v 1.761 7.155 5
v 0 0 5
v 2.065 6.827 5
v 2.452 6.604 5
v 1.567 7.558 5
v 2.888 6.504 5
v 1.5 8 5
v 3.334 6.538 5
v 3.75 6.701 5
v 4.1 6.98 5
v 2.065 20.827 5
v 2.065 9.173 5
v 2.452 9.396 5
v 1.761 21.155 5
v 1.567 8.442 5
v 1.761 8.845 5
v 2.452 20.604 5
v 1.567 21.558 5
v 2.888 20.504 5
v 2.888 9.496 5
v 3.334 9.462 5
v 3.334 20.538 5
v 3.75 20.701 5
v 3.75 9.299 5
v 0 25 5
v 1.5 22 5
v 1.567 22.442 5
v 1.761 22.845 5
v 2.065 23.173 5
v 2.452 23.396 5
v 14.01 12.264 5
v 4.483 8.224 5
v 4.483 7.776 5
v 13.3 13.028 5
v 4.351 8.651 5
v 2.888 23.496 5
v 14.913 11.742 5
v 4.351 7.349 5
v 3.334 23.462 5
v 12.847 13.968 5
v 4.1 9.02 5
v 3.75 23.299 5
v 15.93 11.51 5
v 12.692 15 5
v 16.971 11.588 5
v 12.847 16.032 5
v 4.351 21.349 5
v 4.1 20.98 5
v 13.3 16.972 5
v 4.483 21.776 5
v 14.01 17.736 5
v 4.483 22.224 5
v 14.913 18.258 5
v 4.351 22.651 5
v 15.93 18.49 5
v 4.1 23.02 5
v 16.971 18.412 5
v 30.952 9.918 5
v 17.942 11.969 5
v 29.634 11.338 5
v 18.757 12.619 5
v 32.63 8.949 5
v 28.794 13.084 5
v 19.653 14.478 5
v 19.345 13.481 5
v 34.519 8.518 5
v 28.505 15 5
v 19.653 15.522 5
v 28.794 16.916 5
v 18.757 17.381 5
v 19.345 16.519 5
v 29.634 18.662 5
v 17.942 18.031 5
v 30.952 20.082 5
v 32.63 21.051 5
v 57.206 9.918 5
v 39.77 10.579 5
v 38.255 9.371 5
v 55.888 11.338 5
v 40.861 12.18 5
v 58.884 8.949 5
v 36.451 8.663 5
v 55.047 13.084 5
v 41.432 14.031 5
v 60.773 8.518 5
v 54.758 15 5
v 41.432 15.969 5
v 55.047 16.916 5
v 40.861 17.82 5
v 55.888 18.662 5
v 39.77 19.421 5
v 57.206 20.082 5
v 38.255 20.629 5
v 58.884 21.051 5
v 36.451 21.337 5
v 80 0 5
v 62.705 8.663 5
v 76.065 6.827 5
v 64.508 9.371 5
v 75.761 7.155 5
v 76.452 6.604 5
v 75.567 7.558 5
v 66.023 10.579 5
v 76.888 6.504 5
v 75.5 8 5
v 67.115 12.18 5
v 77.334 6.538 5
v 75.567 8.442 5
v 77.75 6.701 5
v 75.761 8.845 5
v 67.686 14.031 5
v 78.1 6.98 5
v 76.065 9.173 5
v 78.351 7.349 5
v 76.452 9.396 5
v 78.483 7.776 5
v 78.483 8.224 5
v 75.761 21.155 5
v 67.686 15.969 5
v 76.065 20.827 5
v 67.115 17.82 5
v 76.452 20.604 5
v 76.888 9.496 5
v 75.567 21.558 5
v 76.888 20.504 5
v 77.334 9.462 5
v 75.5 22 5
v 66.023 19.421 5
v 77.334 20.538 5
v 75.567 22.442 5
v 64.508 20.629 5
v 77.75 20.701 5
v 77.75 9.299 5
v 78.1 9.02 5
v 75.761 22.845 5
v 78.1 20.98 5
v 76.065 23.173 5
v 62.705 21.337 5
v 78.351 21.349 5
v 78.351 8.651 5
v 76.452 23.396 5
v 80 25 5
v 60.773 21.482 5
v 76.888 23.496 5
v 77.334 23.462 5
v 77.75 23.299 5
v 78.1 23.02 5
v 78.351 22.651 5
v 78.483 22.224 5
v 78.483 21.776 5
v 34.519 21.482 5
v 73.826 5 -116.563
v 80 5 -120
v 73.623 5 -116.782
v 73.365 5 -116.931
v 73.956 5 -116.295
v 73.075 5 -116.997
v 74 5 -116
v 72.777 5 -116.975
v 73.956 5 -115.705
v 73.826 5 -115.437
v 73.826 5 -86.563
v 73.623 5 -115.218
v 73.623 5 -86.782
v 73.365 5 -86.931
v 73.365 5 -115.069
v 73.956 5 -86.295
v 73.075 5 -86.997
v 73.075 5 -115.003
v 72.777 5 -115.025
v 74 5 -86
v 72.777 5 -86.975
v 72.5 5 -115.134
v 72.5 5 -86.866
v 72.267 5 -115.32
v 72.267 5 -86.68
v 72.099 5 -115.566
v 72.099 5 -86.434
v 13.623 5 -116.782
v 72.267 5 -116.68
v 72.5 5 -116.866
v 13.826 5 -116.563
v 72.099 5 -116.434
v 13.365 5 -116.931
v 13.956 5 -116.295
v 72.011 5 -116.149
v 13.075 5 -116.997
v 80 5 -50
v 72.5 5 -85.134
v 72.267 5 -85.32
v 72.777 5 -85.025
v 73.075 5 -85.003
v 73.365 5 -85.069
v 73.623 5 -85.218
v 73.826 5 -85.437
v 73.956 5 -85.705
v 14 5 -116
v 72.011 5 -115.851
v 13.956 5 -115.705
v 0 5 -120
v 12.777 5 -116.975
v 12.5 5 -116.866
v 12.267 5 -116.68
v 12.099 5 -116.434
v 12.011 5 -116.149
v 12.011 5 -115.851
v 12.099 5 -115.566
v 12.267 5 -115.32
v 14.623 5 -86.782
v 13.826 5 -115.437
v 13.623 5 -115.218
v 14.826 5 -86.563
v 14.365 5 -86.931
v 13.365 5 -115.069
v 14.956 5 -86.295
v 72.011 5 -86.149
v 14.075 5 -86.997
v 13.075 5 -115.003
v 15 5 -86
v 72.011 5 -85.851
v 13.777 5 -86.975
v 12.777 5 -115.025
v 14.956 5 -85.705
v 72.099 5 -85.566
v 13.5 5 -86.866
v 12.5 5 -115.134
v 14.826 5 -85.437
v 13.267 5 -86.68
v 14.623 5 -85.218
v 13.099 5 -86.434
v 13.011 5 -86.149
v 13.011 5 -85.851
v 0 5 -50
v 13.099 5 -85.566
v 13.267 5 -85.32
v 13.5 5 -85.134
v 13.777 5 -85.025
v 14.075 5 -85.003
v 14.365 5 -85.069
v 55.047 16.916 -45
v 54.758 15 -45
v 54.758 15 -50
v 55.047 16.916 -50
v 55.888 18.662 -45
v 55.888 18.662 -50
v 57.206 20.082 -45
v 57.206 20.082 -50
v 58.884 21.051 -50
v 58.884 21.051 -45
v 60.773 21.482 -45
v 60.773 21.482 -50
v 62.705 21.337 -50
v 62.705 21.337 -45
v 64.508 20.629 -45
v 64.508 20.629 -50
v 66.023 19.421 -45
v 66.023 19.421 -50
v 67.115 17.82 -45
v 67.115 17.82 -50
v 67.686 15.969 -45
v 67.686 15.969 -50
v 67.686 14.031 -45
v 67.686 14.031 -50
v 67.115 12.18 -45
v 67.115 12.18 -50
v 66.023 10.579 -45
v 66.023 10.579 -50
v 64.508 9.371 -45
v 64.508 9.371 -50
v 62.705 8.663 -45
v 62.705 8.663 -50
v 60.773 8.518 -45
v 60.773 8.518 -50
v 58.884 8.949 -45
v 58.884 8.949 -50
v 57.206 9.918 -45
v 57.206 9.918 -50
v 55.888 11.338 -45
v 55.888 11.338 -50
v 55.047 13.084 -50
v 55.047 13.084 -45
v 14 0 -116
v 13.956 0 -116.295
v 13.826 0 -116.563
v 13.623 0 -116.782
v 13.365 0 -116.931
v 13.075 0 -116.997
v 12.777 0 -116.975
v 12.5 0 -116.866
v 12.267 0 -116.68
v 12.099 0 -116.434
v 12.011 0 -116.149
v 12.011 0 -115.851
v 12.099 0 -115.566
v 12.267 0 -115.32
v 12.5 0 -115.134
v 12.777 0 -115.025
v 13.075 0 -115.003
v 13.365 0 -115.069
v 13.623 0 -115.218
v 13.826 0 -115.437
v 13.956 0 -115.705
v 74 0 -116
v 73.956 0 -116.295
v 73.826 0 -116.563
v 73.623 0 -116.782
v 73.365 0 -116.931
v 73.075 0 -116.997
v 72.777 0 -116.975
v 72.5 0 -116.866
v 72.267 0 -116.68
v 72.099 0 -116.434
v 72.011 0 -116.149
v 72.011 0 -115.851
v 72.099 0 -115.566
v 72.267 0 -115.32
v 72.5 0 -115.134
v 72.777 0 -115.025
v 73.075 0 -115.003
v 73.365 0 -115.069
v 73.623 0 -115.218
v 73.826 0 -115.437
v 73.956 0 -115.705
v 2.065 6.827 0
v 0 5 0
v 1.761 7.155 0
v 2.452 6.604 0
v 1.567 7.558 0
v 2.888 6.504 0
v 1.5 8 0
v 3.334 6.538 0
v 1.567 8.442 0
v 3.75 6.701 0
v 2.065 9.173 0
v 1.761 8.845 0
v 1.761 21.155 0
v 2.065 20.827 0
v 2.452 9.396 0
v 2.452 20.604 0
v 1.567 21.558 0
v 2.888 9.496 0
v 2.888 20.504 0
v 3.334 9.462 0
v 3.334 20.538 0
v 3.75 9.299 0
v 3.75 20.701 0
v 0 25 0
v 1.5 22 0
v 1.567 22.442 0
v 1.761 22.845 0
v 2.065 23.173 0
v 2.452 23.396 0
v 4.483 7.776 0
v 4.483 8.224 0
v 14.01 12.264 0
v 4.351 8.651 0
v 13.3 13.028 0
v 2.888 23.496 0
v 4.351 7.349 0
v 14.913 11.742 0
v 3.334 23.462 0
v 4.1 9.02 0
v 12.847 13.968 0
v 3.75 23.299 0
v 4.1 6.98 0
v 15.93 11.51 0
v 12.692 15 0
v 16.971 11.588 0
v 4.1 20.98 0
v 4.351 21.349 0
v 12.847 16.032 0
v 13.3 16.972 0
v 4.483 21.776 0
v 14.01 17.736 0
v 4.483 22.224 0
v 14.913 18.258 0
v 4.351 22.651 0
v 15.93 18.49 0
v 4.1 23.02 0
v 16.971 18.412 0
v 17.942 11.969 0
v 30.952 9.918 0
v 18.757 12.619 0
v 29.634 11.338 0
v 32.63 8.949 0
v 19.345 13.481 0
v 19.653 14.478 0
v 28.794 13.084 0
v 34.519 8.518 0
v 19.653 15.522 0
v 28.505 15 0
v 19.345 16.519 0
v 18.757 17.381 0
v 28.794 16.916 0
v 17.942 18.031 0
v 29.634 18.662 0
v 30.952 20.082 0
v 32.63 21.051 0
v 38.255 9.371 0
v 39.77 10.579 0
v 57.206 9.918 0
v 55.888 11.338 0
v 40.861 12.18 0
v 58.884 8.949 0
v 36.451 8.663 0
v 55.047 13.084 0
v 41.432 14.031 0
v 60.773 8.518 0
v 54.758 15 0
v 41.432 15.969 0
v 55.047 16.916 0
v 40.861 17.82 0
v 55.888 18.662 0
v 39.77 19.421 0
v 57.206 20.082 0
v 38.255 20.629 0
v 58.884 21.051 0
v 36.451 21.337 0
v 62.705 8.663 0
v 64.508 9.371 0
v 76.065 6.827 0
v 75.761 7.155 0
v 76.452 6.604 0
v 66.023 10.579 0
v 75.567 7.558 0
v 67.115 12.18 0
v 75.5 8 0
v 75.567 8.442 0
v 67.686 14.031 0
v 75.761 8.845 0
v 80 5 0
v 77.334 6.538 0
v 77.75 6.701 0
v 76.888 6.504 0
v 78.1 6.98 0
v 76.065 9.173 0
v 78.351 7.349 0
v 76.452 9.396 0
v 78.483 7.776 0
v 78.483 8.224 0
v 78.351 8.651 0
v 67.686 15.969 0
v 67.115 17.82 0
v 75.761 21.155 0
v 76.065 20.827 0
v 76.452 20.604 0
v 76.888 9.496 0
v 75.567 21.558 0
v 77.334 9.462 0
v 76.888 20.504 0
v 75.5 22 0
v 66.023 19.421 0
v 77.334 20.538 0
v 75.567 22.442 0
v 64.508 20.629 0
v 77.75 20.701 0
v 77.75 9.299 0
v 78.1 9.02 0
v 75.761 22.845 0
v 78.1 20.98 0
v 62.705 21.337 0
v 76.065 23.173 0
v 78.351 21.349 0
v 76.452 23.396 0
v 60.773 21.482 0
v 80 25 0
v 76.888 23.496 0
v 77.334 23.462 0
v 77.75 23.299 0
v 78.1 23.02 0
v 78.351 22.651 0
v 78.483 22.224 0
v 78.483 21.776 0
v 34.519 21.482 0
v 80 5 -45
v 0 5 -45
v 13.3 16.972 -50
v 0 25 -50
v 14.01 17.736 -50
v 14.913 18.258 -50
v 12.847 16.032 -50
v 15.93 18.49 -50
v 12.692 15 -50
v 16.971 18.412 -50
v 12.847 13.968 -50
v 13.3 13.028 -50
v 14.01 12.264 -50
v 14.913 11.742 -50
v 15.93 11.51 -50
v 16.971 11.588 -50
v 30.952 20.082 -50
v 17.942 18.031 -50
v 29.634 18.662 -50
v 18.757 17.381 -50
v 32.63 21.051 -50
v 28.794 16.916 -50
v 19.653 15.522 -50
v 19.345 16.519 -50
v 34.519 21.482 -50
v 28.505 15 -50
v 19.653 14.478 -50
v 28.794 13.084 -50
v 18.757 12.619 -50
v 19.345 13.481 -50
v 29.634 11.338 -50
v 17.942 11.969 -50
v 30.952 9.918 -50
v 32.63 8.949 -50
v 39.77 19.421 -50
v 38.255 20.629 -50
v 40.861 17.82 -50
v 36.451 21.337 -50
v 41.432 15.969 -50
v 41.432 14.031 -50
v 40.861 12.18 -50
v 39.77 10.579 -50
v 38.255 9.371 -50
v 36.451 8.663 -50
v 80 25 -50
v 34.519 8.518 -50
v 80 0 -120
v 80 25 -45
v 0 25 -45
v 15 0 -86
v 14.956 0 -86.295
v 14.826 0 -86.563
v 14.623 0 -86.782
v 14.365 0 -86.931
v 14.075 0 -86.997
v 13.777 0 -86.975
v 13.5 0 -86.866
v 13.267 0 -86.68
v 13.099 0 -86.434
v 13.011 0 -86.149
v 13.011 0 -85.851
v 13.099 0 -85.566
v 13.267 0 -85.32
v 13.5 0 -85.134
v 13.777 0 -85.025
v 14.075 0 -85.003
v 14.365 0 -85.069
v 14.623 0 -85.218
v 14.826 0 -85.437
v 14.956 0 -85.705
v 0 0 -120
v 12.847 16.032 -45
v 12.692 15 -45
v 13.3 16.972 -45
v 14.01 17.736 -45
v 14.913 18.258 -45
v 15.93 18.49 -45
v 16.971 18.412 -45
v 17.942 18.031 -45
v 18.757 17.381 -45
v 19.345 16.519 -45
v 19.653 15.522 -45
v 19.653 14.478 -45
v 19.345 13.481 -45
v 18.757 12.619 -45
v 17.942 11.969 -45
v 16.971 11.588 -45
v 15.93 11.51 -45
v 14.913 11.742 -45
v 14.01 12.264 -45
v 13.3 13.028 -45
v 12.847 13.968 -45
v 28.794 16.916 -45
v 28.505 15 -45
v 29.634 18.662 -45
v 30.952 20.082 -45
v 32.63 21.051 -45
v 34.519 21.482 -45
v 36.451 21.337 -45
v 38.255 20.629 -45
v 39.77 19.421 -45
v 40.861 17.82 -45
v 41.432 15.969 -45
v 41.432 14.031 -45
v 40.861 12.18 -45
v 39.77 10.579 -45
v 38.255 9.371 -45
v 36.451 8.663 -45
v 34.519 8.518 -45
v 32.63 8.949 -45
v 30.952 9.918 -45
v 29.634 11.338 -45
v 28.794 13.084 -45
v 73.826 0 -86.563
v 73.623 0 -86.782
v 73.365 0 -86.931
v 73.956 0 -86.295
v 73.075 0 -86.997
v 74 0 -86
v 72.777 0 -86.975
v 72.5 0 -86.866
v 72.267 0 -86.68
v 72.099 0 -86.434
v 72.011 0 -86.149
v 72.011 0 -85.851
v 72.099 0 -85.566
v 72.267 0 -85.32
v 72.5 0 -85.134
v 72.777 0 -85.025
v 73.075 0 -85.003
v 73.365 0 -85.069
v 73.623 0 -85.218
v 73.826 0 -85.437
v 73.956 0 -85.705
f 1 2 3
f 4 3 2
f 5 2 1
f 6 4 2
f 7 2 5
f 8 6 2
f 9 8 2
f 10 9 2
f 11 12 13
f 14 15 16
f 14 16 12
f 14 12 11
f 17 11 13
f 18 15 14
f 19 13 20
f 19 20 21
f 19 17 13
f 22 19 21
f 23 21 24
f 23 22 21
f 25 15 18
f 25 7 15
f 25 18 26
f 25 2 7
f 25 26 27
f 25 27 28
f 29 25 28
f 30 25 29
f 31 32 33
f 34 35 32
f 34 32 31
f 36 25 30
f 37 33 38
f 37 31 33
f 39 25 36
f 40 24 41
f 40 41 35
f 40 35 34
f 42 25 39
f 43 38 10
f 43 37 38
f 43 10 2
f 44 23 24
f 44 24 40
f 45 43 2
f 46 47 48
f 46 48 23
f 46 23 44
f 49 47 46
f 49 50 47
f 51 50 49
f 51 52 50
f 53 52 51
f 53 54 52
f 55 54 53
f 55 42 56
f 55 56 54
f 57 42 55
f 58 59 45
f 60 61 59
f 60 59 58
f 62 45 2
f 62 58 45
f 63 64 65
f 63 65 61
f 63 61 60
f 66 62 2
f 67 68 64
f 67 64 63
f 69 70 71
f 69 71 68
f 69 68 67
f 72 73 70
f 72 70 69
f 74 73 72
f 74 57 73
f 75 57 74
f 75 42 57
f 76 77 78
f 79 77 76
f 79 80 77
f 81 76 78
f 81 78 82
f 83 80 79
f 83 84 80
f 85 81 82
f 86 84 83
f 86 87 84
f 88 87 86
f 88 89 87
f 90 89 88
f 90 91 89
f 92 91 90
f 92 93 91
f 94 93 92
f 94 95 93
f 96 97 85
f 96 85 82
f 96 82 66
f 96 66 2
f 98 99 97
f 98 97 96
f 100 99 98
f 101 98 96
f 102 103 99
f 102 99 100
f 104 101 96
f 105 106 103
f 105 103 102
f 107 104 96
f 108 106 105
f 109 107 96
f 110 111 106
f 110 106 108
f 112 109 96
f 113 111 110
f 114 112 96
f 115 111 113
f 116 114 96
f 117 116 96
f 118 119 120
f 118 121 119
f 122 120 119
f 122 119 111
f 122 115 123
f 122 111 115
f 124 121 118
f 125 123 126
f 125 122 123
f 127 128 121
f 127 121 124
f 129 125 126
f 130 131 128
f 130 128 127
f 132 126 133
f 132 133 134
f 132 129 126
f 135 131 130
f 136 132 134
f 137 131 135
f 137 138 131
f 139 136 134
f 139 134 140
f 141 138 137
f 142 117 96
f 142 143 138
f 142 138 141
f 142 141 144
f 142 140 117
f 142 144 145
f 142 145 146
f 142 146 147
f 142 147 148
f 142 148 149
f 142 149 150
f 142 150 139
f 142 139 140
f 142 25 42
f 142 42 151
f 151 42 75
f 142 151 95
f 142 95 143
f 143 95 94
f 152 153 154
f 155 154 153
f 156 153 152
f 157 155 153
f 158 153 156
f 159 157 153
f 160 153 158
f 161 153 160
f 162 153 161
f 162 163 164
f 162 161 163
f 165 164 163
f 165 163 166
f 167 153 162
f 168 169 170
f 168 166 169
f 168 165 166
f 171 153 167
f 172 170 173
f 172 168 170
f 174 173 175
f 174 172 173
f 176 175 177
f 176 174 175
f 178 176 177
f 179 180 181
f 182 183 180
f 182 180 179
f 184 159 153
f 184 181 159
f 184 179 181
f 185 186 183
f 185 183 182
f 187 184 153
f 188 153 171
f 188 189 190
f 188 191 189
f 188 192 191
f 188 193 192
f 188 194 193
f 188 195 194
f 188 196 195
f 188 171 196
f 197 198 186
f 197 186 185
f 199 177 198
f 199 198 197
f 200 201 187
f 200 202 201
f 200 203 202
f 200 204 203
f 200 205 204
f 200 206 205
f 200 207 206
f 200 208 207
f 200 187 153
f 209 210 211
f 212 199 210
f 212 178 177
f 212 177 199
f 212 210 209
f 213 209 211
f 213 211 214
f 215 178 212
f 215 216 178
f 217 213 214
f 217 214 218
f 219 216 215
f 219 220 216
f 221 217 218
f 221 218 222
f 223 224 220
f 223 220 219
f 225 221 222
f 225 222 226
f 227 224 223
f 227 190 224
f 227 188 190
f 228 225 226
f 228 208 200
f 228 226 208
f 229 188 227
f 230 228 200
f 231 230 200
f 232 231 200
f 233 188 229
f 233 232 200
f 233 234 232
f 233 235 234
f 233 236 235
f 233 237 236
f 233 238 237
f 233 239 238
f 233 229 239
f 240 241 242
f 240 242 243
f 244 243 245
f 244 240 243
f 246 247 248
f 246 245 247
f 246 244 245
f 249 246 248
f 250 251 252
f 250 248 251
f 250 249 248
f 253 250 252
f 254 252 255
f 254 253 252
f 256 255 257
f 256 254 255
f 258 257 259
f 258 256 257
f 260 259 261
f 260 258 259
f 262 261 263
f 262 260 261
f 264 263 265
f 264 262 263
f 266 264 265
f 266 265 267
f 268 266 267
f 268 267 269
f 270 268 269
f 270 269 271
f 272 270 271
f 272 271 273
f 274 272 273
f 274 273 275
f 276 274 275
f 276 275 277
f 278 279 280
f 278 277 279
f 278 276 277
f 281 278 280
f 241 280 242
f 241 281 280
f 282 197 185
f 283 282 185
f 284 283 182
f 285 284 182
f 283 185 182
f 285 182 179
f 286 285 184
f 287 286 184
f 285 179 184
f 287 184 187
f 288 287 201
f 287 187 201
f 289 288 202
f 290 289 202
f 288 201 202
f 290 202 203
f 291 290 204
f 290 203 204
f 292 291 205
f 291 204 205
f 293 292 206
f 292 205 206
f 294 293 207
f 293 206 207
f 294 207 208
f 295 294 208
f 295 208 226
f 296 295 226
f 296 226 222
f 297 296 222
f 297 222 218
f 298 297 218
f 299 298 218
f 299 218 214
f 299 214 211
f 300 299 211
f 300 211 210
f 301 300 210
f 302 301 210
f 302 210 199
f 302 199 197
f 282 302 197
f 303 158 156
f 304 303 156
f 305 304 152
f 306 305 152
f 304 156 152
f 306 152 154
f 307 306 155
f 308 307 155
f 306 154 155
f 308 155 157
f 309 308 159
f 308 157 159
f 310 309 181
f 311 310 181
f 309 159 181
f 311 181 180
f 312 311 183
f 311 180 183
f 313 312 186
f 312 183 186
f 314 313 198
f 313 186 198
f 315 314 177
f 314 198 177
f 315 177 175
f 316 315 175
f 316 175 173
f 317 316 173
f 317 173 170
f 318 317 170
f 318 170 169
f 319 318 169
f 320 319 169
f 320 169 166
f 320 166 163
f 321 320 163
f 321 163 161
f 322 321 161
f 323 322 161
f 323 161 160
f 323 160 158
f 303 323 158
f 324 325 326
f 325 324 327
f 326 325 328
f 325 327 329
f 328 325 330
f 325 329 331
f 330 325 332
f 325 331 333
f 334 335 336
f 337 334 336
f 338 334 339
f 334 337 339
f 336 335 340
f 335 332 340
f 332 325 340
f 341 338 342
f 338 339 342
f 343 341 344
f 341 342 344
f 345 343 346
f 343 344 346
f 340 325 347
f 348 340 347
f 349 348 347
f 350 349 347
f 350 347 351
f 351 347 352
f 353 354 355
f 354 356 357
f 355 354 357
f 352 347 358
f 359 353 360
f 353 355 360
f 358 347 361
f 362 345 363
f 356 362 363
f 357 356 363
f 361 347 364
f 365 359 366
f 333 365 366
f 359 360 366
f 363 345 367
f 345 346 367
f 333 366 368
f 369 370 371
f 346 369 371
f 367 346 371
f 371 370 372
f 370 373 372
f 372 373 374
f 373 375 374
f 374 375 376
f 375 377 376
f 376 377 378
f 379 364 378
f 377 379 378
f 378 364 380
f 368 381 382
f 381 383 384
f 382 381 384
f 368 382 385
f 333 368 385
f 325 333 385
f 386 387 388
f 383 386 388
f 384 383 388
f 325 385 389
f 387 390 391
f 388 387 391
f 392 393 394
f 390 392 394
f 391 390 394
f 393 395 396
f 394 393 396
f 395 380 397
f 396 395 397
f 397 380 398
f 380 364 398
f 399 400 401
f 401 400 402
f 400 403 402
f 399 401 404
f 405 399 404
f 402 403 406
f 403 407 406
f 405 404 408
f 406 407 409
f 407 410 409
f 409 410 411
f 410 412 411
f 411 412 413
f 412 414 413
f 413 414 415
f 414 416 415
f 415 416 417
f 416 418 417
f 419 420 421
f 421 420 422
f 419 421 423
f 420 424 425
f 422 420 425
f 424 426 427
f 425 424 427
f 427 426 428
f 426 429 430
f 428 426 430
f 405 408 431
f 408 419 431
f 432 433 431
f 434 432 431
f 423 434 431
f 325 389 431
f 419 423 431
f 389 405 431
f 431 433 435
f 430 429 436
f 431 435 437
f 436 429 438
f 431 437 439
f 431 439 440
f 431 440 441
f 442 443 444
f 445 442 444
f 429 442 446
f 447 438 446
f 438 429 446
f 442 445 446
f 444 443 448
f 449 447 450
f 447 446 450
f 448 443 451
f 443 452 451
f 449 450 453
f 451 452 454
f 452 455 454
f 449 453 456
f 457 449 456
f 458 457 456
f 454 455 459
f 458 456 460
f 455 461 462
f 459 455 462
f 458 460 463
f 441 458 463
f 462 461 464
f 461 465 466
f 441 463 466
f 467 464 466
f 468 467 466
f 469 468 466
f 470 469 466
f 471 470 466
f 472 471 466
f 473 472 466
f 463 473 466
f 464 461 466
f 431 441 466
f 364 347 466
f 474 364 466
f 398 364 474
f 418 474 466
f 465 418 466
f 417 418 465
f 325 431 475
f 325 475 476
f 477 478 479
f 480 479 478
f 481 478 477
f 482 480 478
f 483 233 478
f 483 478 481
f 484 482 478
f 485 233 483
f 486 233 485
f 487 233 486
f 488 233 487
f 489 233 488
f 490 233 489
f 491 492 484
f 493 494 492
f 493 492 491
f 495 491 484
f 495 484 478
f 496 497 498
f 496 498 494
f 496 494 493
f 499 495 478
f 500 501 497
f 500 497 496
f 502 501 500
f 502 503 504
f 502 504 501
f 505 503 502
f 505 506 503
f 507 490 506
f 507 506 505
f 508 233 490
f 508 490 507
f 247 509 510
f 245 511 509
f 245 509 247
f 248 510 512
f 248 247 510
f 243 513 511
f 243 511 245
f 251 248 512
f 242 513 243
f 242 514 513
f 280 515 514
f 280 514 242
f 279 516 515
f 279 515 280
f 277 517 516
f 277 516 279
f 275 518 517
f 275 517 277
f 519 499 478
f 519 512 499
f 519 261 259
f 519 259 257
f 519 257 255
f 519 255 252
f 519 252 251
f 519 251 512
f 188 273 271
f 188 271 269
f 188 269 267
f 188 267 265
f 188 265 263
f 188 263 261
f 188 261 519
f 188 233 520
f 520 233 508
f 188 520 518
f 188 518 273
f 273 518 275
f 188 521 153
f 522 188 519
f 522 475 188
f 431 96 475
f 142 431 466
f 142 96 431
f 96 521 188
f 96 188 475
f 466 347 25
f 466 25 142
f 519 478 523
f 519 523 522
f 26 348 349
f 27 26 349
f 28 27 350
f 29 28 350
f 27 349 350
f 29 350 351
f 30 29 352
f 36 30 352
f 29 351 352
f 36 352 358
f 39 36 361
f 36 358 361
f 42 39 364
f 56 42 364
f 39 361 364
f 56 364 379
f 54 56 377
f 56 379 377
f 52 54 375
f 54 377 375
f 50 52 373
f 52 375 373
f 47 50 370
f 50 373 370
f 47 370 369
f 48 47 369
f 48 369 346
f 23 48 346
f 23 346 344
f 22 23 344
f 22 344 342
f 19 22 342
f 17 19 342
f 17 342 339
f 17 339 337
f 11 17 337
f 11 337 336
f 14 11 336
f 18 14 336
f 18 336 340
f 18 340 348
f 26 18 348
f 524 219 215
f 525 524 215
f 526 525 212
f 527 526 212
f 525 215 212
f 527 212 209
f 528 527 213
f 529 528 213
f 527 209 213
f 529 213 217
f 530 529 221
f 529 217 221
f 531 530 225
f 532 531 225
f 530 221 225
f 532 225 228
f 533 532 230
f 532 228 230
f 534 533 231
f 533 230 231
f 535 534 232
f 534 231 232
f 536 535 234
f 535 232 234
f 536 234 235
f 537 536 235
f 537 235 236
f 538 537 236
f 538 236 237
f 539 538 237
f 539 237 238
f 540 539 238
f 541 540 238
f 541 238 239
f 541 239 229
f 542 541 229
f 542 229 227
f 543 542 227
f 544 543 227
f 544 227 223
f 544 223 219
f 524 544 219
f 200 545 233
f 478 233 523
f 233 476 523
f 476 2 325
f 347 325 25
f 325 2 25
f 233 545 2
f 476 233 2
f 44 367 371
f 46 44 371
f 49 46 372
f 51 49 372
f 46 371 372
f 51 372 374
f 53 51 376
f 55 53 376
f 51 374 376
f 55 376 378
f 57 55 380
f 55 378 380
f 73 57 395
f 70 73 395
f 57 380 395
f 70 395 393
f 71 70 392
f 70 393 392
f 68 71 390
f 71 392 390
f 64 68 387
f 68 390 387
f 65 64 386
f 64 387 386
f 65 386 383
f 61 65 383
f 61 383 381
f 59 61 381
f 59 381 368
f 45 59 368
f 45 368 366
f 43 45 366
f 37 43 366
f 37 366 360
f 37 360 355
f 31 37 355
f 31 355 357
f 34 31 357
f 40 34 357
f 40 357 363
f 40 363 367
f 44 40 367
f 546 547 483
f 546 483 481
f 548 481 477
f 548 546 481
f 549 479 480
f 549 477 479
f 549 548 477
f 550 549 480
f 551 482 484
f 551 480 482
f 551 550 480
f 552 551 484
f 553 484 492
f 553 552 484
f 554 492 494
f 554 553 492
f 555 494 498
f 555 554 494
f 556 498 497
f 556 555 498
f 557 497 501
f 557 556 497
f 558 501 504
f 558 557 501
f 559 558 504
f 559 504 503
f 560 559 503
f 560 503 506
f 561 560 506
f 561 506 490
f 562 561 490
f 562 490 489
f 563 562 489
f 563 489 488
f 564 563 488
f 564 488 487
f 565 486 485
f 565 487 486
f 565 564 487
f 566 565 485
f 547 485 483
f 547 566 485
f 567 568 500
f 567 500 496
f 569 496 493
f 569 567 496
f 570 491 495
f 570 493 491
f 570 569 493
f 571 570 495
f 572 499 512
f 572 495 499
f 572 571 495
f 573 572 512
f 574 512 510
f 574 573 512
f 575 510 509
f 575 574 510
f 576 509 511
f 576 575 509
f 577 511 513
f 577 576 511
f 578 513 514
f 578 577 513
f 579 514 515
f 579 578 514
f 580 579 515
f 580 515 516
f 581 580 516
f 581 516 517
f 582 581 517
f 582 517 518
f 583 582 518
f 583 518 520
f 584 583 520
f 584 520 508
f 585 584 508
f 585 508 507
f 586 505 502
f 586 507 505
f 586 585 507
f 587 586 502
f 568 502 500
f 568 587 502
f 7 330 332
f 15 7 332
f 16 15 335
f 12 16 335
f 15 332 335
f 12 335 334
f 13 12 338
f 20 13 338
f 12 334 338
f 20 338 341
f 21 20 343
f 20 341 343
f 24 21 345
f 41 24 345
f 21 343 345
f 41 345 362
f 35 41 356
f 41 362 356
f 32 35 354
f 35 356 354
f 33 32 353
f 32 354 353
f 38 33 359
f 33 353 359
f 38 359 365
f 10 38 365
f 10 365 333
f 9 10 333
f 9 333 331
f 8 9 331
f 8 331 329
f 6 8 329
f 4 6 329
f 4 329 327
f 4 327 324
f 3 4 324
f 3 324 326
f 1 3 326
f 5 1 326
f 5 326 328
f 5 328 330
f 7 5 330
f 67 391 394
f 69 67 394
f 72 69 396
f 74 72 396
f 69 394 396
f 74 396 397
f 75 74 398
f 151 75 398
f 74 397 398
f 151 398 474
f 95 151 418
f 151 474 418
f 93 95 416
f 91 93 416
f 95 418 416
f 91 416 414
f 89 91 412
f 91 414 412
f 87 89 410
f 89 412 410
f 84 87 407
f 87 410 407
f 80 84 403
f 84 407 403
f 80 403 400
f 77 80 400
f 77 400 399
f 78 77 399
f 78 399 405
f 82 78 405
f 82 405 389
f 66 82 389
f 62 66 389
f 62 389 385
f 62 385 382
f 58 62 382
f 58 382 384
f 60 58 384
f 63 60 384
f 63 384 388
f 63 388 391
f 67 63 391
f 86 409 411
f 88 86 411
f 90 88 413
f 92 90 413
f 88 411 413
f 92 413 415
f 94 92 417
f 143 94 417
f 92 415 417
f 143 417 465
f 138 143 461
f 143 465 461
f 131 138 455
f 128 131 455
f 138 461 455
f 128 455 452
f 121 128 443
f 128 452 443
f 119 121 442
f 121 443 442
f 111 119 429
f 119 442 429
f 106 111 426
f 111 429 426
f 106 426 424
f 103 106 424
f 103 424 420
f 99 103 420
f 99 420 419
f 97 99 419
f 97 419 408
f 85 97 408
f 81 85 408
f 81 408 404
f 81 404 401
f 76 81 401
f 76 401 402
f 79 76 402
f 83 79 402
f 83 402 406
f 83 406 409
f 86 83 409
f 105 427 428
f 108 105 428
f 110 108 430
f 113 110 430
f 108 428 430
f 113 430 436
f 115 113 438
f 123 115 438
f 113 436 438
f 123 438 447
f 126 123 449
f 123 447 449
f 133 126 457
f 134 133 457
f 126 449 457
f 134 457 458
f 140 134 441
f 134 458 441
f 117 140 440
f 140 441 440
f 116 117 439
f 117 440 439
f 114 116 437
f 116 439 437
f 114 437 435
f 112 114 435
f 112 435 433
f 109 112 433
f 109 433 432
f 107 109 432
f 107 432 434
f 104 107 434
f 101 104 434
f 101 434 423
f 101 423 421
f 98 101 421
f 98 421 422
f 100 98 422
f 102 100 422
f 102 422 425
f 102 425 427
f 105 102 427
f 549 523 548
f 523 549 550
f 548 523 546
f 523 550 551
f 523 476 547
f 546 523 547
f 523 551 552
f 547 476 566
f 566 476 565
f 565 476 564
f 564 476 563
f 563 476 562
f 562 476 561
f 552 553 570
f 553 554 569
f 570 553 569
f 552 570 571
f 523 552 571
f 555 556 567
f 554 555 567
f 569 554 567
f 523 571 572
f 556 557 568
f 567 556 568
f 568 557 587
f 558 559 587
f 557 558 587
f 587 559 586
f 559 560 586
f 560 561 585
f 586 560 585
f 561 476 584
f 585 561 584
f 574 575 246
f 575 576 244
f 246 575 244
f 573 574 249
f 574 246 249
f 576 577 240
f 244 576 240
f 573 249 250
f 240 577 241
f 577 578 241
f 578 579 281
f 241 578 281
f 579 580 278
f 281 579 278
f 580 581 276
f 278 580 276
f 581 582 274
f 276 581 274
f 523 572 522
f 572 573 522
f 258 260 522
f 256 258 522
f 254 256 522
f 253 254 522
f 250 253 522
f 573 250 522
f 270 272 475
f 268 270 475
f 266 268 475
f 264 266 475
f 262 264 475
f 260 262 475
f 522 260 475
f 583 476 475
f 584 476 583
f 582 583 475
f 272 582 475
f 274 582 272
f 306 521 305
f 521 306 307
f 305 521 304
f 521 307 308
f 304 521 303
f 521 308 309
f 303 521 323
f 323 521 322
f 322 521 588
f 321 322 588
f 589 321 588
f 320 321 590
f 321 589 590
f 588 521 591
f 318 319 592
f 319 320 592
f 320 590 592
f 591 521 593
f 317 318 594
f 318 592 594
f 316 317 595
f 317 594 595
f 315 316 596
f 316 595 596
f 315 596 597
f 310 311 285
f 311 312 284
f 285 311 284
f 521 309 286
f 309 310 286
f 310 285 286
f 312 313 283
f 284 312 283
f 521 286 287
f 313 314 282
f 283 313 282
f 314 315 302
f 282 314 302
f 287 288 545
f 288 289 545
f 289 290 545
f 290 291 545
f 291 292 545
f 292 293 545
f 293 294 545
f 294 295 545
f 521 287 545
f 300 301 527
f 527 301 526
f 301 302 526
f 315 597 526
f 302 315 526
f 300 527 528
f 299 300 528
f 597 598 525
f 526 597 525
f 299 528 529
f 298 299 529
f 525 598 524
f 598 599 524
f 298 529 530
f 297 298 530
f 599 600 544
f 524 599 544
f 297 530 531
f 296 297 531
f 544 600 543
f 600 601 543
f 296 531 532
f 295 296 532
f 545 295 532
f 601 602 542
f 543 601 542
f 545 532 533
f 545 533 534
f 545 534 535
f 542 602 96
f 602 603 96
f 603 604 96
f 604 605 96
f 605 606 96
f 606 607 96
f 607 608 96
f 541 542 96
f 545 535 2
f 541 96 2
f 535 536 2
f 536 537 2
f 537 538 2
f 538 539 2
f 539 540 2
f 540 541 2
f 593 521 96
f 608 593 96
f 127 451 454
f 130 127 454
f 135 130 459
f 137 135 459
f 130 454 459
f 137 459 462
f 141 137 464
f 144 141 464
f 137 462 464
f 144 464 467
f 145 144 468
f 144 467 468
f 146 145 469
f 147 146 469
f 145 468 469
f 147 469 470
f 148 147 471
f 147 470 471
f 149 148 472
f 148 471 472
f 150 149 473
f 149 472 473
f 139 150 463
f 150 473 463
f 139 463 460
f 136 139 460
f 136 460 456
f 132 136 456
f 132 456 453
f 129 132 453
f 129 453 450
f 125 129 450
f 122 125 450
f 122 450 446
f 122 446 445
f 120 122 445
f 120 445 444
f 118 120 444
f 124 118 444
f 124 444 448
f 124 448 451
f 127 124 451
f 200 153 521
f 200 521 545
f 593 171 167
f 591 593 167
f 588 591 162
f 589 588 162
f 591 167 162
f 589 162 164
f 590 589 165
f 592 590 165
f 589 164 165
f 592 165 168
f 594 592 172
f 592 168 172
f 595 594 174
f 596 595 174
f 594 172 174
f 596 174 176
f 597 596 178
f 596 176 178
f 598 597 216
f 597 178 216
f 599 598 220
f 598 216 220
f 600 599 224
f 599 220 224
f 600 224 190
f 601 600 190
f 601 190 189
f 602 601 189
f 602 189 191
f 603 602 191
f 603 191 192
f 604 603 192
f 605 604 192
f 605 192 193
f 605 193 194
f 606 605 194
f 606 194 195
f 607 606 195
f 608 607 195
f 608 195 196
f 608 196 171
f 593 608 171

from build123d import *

# Parameters (mm, degrees)
SKETCH_1_W               = 80
SKETCH_1_H               = 25
EXTRUDE_1_DEPTH          = 5
SKETCH_2_W               = 80
SKETCH_2_H               = 5
EXTRUDE_2_DEPTH          = 120
SKETCH_3_W               = 80
SKETCH_3_H               = 5
EXTRUDE_3_DEPTH          = 20
SKETCH_4_R               = 1.5
CUT_EXTRUDE_1_DEPTH      = 20
SKETCH_5_R               = 6.5
CUT_EXTRUDE_2_DEPTH      = 121
CUT_EXTRUDE_2_DEPTH_BACK = 6
SKETCH_6_R               = 3.5
CUT_EXTRUDE_3_DEPTH      = 121
CUT_EXTRUDE_3_DEPTH_BACK = 6
SKETCH_7_R               = 1
CUT_EXTRUDE_4_DEPTH      = 20


with BuildPart() as part:
    # 스케치1 → 보스-돌출1 (new body)
    with BuildSketch(Plane.XY):
        with Locations((40, 12.5)):
            Rectangle(SKETCH_1_W, SKETCH_1_H)
    extrude(amount=EXTRUDE_1_DEPTH)

    # 스케치2 → 보스-돌출2 (add)
    with BuildSketch(Plane(origin=(0, 0, 0), x_dir=(-1, 0, 0), z_dir=(0, 0, -1))):
        with Locations((-40, 2.5)):
            Rectangle(SKETCH_2_W, SKETCH_2_H)
    extrude(amount=EXTRUDE_2_DEPTH)

    # 스케치3 → 보스-돌출3 (add)
    with BuildSketch(Plane(origin=(0, 5, 0), x_dir=(1, 0, 0), z_dir=(0, 1, 0))):
        with Locations((40, 47.5)):
            Rectangle(SKETCH_3_W, SKETCH_3_H)
    extrude(amount=EXTRUDE_3_DEPTH)

    # 스케치4 → 컷-돌출1 (cut)
    with BuildSketch(Plane(origin=(0, 0, 0), x_dir=(-1, 0, 0), z_dir=(0, 0, -1))):
        with Locations((-77, 22)):
            Circle(SKETCH_4_R)
        with Locations((-77, 8)):
            Circle(SKETCH_4_R)
        with Locations((-3, 22)):
            Circle(SKETCH_4_R)
        with Locations((-3, 8)):
            Circle(SKETCH_4_R)
    extrude(amount=-CUT_EXTRUDE_1_DEPTH, mode=Mode.SUBTRACT)

    # 스케치5 → 컷-돌출2 (cut, two sides)
    with BuildSketch(Plane(origin=(0, 0, 0), x_dir=(-1, 0, 0), z_dir=(0, 0, -1))) as cut_extrude_2_sk:
        with Locations((-61.258324532, 15)):
            Circle(SKETCH_5_R)
        with Locations((-35.004725497, 15)):
            Circle(SKETCH_5_R)
    extrude(amount=CUT_EXTRUDE_2_DEPTH, mode=Mode.SUBTRACT)
    extrude(cut_extrude_2_sk.sketch, amount=-CUT_EXTRUDE_2_DEPTH_BACK, mode=Mode.SUBTRACT)

    # 스케치6 → 컷-돌출3 (cut, two sides)
    with BuildSketch(Plane(origin=(0, 0, 0), x_dir=(-1, 0, 0), z_dir=(0, 0, -1))) as cut_extrude_3_sk:
        with Locations((-16.191806112, 15)):
            Circle(SKETCH_6_R)
    extrude(amount=CUT_EXTRUDE_3_DEPTH, mode=Mode.SUBTRACT)
    extrude(cut_extrude_3_sk.sketch, amount=-CUT_EXTRUDE_3_DEPTH_BACK, mode=Mode.SUBTRACT)

    # 스케치7 → 컷-돌출4 (cut)
    with BuildSketch(Plane(origin=(0, 5, 0), x_dir=(1, 0, 0), z_dir=(0, 1, 0))):
        with Locations((73, 116)):
            Circle(SKETCH_7_R)
        with Locations((73, 86)):
            Circle(SKETCH_7_R)
        with Locations((13, 116)):
            Circle(SKETCH_7_R)
        with Locations((14, 86)):
            Circle(SKETCH_7_R)
    extrude(amount=-CUT_EXTRUDE_4_DEPTH, mode=Mode.SUBTRACT)


solid = part.part
